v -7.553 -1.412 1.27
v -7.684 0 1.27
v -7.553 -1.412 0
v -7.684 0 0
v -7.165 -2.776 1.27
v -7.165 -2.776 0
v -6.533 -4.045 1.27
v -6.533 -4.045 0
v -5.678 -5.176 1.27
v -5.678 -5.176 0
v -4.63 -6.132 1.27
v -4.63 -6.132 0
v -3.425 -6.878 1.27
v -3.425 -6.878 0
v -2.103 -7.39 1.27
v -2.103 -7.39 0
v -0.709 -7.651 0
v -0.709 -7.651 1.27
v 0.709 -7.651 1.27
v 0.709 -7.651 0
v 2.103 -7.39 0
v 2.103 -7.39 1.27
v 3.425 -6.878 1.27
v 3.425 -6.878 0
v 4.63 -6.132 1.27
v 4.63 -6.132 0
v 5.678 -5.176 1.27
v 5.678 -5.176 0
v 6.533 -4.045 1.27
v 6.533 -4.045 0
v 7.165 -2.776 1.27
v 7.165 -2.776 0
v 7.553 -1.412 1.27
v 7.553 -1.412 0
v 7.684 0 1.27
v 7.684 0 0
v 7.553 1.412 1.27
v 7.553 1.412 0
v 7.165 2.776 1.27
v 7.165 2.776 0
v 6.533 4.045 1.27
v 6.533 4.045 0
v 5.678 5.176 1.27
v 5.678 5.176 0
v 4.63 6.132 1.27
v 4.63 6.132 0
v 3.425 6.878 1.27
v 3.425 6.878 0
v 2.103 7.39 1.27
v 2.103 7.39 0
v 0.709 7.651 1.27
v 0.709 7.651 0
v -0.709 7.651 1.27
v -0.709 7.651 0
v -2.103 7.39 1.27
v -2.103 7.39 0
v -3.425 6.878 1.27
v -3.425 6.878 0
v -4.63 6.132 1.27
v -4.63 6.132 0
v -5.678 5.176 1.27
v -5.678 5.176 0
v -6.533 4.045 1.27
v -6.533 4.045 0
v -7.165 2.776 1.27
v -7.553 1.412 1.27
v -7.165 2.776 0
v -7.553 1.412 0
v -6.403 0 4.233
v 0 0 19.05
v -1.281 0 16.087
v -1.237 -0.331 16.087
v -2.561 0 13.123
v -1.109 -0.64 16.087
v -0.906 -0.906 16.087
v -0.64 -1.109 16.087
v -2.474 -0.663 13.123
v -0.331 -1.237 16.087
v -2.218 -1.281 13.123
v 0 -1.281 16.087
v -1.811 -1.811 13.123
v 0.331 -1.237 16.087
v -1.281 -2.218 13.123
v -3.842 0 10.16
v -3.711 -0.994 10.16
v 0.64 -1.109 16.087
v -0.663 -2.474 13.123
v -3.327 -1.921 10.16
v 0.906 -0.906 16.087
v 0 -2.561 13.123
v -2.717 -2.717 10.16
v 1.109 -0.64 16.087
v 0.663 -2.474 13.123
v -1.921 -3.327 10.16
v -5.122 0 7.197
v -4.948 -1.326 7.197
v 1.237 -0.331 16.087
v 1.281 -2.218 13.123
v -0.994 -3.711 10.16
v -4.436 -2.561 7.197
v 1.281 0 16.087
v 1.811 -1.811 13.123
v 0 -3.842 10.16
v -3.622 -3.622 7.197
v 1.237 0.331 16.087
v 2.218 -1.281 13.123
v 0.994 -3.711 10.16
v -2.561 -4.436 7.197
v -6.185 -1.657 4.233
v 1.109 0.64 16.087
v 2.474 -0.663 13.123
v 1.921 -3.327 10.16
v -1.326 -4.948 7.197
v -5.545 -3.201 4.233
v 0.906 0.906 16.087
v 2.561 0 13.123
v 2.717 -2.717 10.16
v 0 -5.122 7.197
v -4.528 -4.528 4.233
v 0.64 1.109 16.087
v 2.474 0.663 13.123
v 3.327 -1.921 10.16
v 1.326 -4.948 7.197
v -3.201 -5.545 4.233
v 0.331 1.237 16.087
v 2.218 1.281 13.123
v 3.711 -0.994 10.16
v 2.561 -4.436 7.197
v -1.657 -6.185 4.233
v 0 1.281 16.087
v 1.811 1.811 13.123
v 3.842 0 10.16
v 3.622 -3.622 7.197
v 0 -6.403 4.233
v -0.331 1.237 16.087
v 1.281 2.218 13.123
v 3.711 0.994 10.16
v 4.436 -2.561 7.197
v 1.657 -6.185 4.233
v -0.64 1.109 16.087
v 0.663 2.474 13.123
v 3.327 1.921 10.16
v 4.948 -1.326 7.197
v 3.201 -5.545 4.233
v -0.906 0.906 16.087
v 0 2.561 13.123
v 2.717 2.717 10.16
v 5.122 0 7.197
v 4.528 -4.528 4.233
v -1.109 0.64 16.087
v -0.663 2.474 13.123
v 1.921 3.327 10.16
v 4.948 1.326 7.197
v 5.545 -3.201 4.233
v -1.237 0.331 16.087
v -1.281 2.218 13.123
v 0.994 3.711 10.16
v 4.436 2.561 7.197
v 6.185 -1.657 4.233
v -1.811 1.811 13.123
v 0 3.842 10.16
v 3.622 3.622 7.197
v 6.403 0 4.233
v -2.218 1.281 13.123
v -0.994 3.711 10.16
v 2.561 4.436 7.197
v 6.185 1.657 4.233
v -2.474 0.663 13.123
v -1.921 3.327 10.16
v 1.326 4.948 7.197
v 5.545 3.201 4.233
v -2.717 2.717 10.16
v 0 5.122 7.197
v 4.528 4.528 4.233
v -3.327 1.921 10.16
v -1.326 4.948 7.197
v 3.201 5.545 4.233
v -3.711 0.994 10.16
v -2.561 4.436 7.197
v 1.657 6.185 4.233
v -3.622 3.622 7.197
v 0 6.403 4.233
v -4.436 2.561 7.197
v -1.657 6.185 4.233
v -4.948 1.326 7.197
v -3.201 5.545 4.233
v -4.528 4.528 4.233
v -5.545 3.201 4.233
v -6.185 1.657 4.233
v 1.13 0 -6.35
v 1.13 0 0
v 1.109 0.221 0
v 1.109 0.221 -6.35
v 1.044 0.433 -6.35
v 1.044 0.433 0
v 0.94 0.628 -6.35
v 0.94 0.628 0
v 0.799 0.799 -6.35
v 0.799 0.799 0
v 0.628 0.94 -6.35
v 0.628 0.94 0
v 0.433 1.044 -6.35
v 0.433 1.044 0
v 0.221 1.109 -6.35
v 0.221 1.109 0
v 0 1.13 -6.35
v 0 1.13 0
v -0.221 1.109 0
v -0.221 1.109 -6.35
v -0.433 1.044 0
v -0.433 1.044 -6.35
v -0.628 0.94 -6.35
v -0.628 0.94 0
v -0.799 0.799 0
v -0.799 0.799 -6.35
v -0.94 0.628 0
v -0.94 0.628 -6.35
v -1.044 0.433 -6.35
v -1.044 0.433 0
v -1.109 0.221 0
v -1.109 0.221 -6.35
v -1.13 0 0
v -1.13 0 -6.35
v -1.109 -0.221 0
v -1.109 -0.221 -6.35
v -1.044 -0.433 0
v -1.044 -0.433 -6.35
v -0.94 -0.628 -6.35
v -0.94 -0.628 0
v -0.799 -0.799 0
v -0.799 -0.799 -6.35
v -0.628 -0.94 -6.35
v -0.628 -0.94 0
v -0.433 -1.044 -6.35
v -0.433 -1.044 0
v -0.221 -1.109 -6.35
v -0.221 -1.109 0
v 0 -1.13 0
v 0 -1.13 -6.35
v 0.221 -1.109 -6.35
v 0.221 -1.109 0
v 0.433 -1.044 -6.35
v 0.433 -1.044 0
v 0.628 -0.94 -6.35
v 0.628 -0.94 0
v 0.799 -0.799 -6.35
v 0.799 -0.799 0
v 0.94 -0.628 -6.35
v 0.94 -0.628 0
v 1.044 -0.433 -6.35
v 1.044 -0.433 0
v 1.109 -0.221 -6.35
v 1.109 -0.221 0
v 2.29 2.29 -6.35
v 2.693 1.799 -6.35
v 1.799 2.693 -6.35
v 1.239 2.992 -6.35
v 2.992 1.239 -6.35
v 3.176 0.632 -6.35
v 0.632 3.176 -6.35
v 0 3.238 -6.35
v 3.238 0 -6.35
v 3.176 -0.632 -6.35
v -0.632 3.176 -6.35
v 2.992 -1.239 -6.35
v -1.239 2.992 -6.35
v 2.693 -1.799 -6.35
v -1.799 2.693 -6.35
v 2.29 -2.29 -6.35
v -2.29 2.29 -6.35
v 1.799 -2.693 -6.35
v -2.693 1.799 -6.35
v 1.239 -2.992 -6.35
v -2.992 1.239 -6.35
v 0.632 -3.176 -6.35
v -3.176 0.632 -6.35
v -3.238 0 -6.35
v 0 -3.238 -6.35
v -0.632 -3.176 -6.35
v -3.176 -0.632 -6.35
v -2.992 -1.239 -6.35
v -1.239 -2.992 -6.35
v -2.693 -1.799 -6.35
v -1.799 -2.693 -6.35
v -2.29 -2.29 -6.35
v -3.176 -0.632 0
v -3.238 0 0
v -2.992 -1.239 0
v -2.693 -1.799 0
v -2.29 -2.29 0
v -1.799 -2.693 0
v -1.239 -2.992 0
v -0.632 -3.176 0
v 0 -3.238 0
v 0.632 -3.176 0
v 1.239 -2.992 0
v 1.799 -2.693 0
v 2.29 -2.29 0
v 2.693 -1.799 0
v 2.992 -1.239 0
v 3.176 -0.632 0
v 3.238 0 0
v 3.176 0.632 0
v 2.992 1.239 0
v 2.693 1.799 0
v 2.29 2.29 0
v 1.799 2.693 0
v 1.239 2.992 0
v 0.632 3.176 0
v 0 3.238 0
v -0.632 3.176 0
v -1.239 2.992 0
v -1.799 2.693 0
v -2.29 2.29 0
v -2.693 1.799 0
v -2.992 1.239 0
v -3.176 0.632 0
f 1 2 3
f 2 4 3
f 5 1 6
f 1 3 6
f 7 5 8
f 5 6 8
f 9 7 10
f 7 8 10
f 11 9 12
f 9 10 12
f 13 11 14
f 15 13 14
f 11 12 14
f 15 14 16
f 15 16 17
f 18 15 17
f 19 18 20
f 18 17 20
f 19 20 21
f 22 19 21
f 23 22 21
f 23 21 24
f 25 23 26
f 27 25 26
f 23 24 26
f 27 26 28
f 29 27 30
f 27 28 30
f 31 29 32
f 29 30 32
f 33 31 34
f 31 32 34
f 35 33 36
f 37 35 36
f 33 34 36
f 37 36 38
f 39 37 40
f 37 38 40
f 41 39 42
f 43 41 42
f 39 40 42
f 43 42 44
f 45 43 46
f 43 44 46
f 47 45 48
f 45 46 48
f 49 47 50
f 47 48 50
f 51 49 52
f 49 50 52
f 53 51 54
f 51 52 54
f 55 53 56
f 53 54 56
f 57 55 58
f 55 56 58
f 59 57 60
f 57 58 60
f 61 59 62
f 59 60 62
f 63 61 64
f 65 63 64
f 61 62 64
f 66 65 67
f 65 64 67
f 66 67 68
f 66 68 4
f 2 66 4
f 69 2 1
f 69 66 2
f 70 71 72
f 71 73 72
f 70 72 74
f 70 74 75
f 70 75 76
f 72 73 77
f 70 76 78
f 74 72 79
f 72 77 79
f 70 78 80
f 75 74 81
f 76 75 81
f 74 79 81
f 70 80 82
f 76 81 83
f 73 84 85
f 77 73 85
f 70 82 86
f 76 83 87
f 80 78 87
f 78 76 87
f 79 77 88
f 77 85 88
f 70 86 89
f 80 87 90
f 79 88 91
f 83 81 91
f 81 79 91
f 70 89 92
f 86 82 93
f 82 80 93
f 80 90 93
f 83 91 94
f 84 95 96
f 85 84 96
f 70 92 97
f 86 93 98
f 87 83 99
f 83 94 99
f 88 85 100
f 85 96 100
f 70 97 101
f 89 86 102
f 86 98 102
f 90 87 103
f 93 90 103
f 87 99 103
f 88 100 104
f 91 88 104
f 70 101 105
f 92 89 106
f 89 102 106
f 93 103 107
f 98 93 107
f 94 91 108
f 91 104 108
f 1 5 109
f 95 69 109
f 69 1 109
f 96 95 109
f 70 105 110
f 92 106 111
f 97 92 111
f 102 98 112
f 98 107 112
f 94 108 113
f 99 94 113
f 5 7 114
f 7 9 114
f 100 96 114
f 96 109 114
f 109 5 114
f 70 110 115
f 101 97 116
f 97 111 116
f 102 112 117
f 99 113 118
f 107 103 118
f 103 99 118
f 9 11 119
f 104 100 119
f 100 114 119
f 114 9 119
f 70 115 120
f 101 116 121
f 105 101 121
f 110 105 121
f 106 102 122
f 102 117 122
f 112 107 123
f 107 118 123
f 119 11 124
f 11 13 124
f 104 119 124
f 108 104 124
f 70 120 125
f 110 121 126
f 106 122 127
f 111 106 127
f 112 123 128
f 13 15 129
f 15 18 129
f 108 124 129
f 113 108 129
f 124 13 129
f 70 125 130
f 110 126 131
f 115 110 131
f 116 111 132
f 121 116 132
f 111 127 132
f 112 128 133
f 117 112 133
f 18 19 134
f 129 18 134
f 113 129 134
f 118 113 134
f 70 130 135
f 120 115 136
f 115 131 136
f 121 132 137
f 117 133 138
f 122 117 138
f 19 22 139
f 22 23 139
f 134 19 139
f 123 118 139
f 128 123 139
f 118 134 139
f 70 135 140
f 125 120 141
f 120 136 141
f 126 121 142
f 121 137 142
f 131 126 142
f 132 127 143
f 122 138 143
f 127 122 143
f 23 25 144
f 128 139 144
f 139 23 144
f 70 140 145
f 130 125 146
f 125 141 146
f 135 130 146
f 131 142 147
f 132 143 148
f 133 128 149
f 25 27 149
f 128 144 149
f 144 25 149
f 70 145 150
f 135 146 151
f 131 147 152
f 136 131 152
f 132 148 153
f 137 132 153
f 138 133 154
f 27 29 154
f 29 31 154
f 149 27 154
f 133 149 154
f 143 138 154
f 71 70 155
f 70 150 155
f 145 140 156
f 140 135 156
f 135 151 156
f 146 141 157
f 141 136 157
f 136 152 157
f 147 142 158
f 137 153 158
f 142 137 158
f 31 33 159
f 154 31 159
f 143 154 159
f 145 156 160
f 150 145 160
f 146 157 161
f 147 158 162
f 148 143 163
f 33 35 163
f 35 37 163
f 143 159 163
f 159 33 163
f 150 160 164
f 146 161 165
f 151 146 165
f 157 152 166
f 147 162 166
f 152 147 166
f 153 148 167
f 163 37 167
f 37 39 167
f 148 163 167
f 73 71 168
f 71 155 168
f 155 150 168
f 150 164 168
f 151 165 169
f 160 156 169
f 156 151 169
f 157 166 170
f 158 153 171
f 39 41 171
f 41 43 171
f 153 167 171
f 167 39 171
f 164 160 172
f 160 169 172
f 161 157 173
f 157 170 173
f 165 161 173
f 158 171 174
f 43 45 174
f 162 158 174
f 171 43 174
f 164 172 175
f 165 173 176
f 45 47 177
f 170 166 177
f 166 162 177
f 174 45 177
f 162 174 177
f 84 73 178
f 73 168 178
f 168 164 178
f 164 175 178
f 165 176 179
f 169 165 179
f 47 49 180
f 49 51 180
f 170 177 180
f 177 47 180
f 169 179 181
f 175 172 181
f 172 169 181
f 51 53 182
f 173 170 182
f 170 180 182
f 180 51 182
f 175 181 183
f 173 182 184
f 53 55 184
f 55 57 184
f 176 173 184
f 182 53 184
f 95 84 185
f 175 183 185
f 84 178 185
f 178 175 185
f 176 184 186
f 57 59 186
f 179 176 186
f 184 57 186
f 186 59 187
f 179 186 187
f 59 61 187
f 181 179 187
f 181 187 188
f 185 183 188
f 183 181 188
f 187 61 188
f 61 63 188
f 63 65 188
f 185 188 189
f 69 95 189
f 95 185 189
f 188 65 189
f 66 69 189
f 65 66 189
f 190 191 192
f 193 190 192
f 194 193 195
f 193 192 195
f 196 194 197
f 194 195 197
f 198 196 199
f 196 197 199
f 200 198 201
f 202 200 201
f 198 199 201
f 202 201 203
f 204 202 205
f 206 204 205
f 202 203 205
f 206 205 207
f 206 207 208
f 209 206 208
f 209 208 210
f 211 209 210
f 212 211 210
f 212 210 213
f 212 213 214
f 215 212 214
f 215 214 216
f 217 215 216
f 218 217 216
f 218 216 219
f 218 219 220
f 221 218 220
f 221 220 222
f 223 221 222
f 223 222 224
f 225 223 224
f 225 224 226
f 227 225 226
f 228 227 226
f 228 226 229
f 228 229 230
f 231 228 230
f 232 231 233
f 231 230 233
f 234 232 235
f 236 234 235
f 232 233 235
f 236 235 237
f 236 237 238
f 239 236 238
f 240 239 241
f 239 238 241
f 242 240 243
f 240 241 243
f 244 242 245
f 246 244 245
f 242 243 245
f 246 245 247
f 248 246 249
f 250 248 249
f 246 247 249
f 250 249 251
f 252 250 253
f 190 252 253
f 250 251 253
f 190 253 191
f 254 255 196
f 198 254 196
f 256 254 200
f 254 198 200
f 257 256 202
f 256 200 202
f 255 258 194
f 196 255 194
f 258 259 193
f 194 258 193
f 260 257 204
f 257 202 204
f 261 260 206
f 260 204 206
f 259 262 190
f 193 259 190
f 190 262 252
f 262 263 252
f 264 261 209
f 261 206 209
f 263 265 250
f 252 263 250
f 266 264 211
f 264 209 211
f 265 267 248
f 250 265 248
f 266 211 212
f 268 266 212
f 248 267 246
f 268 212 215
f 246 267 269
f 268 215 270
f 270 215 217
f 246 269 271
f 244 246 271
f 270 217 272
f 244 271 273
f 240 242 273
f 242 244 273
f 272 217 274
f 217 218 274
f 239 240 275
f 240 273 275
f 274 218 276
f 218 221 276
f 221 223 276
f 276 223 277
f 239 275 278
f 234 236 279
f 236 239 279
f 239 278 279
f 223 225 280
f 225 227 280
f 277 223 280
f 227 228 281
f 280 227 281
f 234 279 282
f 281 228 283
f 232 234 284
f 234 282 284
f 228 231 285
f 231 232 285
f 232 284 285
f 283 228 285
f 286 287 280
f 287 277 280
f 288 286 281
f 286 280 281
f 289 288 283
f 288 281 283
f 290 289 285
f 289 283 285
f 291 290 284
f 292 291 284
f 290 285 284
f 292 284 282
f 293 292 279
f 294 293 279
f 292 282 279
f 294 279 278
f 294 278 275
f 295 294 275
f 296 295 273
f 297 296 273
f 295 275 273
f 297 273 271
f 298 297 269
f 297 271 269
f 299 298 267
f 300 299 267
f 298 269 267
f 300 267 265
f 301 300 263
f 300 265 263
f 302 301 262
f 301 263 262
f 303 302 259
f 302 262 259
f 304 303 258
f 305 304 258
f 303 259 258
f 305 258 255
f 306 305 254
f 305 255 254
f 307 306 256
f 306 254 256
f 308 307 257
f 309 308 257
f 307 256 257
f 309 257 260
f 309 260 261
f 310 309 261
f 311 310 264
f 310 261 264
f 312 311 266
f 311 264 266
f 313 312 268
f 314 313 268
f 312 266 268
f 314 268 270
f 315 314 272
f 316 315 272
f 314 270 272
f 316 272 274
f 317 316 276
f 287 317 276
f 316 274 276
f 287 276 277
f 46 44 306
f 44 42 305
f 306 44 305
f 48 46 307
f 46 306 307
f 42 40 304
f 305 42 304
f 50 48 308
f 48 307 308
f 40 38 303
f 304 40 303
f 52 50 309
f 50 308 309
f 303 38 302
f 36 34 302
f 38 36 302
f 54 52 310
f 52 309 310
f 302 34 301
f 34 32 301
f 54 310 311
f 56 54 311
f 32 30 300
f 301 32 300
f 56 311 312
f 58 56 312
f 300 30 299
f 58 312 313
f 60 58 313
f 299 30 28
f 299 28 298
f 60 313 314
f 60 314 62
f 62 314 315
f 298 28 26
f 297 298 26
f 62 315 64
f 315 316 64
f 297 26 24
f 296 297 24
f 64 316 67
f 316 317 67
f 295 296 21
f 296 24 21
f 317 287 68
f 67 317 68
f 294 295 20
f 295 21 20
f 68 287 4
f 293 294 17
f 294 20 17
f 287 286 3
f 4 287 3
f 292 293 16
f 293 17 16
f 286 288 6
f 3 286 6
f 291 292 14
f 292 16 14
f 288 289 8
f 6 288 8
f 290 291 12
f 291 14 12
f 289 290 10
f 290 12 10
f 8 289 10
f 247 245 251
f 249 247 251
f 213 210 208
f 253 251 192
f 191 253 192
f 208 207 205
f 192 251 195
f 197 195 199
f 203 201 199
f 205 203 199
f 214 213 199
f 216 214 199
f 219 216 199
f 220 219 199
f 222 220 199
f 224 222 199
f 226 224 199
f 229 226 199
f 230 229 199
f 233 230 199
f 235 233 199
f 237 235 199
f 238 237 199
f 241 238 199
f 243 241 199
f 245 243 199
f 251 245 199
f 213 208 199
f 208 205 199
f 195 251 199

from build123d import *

# Parameters (mm, degrees)
F3_D     = 2.2606
F3_DEPTH = 6.351


with BuildPart() as f1:
    # F0 (on Front) → F1 (revolve)
    with BuildSketch(Plane.XZ):
        Polygon((-7.6835, 1.27), (-7.6835, 0), (-3.2385, 0), (-3.2385, -6.35), (0, -6.35), (0, 19.05), align=None)
    revolve(axis=Axis((0, 0, 6.35), (0, 0, 1)))

    # F3 (through all, one way)
    with BuildSketch(Plane.XY):
        with Locations((0, 0)):
            Circle(F3_D / 2)
    extrude(amount=-F3_DEPTH, mode=Mode.SUBTRACT)


solid = f1.part
